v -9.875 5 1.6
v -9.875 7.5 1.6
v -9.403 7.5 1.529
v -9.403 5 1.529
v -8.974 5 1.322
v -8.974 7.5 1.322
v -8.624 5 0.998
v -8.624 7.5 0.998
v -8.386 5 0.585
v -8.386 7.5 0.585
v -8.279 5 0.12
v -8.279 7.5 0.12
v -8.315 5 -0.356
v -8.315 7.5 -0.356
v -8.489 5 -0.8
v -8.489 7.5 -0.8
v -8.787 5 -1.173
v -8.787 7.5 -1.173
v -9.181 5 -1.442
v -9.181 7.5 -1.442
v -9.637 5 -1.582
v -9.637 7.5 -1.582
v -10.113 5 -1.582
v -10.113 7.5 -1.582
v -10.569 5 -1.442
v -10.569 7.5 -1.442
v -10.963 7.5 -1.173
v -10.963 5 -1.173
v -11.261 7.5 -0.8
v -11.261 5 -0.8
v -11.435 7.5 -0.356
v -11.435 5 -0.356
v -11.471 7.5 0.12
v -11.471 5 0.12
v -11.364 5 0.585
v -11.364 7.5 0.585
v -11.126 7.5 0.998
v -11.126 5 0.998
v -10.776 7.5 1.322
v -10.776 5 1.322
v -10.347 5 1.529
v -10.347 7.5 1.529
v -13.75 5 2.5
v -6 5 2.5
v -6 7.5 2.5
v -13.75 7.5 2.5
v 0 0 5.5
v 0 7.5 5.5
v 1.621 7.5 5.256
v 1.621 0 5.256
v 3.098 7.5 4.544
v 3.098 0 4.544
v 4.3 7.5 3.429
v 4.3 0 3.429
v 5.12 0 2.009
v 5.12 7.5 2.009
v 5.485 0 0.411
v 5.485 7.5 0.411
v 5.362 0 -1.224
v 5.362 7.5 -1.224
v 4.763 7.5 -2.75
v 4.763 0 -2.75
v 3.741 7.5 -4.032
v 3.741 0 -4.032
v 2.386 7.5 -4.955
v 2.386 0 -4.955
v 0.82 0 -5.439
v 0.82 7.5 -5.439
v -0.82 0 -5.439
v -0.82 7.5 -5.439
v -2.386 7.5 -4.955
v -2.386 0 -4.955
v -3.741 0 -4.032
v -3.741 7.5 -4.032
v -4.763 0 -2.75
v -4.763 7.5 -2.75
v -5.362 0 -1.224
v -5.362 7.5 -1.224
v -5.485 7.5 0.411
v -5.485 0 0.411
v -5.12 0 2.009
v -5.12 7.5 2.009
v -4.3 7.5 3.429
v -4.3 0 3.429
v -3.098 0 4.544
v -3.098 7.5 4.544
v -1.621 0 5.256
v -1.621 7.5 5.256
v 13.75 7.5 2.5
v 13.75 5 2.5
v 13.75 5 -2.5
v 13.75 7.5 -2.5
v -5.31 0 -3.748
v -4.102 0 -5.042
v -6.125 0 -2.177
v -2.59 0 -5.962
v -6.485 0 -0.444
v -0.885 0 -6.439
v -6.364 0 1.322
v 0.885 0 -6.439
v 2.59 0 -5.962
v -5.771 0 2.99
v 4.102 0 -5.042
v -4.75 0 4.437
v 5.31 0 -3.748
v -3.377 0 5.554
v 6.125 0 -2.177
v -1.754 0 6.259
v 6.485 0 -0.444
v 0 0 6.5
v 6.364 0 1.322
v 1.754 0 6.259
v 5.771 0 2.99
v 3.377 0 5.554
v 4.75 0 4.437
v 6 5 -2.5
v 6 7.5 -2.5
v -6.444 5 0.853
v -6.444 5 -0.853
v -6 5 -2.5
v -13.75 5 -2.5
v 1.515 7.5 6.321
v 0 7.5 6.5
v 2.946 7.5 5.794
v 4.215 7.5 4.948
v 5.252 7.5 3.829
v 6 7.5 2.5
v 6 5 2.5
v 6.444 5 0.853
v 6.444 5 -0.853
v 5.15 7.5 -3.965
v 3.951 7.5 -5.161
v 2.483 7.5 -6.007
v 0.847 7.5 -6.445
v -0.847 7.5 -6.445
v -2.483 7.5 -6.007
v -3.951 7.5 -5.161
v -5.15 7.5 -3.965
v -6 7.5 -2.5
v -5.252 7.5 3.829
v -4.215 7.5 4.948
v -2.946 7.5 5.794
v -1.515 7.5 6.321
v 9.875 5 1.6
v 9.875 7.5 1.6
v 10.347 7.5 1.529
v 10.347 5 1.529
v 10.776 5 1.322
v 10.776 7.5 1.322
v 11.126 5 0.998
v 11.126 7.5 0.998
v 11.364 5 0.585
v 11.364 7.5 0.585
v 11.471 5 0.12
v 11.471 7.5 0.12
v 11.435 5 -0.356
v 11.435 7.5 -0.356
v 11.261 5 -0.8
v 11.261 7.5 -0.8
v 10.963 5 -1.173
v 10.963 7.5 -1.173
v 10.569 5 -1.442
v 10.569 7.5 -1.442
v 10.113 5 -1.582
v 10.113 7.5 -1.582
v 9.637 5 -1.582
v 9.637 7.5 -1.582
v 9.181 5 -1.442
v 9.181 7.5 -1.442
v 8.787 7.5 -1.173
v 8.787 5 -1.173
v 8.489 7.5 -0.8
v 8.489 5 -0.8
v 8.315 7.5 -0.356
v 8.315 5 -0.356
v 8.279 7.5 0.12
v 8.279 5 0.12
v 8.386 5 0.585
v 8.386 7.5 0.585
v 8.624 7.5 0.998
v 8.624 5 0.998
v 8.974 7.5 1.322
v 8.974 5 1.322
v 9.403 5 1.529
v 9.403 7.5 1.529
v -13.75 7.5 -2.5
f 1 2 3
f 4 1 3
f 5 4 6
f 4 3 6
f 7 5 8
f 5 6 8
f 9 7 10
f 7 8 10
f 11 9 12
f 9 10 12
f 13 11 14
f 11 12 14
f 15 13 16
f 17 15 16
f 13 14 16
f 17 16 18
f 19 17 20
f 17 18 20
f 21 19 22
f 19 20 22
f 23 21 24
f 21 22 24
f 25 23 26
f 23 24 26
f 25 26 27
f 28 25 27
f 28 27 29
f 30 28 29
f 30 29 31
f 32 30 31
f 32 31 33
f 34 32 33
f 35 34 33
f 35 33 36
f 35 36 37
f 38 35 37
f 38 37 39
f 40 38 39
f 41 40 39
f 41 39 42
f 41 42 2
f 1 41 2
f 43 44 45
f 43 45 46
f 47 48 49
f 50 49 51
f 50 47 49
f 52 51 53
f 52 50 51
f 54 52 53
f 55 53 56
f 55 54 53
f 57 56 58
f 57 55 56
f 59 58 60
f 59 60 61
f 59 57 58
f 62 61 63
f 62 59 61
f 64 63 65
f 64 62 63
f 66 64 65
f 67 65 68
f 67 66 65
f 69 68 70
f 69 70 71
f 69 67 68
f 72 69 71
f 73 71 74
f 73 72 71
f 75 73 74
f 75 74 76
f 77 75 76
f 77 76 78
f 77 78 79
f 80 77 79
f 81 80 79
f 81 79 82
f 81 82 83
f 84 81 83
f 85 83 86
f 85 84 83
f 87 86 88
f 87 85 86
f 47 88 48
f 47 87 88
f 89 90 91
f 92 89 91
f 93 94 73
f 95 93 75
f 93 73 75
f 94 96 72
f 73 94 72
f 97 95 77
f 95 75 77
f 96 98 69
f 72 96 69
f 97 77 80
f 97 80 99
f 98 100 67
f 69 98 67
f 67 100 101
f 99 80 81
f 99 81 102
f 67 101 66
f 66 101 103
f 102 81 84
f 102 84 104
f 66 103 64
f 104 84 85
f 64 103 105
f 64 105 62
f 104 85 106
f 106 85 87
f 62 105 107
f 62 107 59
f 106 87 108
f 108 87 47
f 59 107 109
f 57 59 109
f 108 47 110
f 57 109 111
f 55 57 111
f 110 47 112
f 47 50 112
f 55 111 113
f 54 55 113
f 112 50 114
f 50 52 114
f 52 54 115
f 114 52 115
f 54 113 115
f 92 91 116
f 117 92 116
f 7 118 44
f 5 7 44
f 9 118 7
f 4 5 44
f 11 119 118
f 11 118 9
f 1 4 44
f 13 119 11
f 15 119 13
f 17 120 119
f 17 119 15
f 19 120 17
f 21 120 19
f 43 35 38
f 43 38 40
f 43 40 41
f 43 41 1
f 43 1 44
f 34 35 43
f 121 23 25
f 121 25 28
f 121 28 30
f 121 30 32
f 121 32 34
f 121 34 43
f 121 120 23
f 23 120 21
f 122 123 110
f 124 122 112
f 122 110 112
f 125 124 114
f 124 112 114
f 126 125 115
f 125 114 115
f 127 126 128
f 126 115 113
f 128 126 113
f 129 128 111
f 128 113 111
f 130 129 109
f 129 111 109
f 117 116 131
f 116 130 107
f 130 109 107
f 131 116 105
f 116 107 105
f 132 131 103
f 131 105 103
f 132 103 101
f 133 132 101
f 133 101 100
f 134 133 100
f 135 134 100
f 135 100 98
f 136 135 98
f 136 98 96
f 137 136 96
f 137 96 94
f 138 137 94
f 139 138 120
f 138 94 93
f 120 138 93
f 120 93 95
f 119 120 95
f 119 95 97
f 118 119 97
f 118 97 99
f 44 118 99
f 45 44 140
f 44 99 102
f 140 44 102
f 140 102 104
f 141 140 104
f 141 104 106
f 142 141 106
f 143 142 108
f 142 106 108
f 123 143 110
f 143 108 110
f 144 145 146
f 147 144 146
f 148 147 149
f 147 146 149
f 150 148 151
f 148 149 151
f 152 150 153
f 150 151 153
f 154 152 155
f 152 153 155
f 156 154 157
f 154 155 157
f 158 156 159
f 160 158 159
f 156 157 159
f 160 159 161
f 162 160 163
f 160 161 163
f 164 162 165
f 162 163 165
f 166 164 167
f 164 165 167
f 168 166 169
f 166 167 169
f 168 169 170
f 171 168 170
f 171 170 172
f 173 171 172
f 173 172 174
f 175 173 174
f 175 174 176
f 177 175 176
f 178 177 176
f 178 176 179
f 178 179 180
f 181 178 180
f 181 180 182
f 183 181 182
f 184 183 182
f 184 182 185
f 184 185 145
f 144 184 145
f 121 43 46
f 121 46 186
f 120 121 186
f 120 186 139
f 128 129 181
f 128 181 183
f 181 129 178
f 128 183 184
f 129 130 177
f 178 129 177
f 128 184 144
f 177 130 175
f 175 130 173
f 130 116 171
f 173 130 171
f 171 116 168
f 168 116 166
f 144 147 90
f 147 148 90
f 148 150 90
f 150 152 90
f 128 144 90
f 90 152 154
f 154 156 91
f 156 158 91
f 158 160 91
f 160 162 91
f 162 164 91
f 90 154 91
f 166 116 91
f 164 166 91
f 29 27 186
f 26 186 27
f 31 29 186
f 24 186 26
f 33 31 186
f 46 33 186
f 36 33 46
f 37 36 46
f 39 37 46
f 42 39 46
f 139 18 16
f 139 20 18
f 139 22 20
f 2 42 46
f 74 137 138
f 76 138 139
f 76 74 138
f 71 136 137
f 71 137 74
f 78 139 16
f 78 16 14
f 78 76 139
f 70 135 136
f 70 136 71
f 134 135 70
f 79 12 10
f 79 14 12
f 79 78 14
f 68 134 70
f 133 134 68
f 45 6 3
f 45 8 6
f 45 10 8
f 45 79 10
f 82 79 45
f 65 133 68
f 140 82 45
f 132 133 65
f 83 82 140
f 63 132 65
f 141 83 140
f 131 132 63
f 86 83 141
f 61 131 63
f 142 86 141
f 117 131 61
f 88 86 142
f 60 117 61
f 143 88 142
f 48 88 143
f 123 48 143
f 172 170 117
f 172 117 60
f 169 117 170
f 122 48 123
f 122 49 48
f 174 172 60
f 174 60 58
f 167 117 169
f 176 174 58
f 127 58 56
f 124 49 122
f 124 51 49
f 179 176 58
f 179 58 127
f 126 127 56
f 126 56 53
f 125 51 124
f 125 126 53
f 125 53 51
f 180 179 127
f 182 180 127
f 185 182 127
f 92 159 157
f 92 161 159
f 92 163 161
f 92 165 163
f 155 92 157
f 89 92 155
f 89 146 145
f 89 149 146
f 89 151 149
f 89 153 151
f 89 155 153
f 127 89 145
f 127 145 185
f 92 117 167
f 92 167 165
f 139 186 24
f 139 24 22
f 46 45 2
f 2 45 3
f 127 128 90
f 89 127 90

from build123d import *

# Parameters (mm, degrees)
SKETCH1_R                = 6.5
SKETCH1_R_2              = 5.5
BOSS_EXTRUDE1_DEPTH      = 7.5
BOSS_EXTRUDE2_START      = -2.5
BOSS_EXTRUDE2_DEPTH      = 2.5
M3_CLEARANCE_HOLE1_D     = 3.2
M3_CLEARANCE_HOLE1_DEPTH = 5
M3_CLEARANCE_HOLE1_TIP   = 0.96137699


with BuildPart() as part:
    # Sketch1 → Boss-Extrude1 (new body)
    with BuildSketch(Plane(origin=(0, 0, 0), x_dir=(1, 0, 0), z_dir=(0, 1, 0))):
        with Locations(Location((0, 0, 0), (0, 0, 270))):
            Circle(SKETCH1_R)
        with Locations(Location((0, 0, 0), (0, 0, 270))):
            Circle(SKETCH1_R_2, mode=Mode.SUBTRACT)
    extrude(amount=BOSS_EXTRUDE1_DEPTH)

    # Sketch2 → Boss-Extrude2 (add)
    with BuildSketch(Plane(origin=(0, 7.5, 0), x_dir=(1, 0, 0), z_dir=(0, 1, 0)).offset(BOSS_EXTRUDE2_START)):
        with BuildLine():
            Line((-13.75, 2.5), (-6, 2.5))
            ThreePointArc((-6, 2.5), (-6.5, 0), (-6, -2.5))
            Line((-6, -2.5), (-13.75, -2.5))
            Line((-13.75, -2.5), (-13.75, 2.5))
        make_face()
        with BuildLine():
            Line((13.75, -2.5), (13.75, 2.5))
            Line((13.75, 2.5), (6, 2.5))
            ThreePointArc((6, 2.5), (6.5, 0), (6, -2.5))
            Line((6, -2.5), (13.75, -2.5))
        make_face()
    extrude(amount=BOSS_EXTRUDE2_DEPTH)

    # M3 Clearance Hole1
    with Locations(Plane(origin=(9.875, 5, 0), x_dir=(0, 0, -1), z_dir=(0, -1, 0))):
        with Locations((0, 0), (0, -19.75)):
            Hole(M3_CLEARANCE_HOLE1_D / 2, depth=M3_CLEARANCE_HOLE1_DEPTH)
            with Locations((0, 0, -(M3_CLEARANCE_HOLE1_DEPTH + M3_CLEARANCE_HOLE1_TIP / 2))):  # 118° drill point
                Cone(0, M3_CLEARANCE_HOLE1_D / 2, M3_CLEARANCE_HOLE1_TIP, mode=Mode.SUBTRACT)


solid = part.part
